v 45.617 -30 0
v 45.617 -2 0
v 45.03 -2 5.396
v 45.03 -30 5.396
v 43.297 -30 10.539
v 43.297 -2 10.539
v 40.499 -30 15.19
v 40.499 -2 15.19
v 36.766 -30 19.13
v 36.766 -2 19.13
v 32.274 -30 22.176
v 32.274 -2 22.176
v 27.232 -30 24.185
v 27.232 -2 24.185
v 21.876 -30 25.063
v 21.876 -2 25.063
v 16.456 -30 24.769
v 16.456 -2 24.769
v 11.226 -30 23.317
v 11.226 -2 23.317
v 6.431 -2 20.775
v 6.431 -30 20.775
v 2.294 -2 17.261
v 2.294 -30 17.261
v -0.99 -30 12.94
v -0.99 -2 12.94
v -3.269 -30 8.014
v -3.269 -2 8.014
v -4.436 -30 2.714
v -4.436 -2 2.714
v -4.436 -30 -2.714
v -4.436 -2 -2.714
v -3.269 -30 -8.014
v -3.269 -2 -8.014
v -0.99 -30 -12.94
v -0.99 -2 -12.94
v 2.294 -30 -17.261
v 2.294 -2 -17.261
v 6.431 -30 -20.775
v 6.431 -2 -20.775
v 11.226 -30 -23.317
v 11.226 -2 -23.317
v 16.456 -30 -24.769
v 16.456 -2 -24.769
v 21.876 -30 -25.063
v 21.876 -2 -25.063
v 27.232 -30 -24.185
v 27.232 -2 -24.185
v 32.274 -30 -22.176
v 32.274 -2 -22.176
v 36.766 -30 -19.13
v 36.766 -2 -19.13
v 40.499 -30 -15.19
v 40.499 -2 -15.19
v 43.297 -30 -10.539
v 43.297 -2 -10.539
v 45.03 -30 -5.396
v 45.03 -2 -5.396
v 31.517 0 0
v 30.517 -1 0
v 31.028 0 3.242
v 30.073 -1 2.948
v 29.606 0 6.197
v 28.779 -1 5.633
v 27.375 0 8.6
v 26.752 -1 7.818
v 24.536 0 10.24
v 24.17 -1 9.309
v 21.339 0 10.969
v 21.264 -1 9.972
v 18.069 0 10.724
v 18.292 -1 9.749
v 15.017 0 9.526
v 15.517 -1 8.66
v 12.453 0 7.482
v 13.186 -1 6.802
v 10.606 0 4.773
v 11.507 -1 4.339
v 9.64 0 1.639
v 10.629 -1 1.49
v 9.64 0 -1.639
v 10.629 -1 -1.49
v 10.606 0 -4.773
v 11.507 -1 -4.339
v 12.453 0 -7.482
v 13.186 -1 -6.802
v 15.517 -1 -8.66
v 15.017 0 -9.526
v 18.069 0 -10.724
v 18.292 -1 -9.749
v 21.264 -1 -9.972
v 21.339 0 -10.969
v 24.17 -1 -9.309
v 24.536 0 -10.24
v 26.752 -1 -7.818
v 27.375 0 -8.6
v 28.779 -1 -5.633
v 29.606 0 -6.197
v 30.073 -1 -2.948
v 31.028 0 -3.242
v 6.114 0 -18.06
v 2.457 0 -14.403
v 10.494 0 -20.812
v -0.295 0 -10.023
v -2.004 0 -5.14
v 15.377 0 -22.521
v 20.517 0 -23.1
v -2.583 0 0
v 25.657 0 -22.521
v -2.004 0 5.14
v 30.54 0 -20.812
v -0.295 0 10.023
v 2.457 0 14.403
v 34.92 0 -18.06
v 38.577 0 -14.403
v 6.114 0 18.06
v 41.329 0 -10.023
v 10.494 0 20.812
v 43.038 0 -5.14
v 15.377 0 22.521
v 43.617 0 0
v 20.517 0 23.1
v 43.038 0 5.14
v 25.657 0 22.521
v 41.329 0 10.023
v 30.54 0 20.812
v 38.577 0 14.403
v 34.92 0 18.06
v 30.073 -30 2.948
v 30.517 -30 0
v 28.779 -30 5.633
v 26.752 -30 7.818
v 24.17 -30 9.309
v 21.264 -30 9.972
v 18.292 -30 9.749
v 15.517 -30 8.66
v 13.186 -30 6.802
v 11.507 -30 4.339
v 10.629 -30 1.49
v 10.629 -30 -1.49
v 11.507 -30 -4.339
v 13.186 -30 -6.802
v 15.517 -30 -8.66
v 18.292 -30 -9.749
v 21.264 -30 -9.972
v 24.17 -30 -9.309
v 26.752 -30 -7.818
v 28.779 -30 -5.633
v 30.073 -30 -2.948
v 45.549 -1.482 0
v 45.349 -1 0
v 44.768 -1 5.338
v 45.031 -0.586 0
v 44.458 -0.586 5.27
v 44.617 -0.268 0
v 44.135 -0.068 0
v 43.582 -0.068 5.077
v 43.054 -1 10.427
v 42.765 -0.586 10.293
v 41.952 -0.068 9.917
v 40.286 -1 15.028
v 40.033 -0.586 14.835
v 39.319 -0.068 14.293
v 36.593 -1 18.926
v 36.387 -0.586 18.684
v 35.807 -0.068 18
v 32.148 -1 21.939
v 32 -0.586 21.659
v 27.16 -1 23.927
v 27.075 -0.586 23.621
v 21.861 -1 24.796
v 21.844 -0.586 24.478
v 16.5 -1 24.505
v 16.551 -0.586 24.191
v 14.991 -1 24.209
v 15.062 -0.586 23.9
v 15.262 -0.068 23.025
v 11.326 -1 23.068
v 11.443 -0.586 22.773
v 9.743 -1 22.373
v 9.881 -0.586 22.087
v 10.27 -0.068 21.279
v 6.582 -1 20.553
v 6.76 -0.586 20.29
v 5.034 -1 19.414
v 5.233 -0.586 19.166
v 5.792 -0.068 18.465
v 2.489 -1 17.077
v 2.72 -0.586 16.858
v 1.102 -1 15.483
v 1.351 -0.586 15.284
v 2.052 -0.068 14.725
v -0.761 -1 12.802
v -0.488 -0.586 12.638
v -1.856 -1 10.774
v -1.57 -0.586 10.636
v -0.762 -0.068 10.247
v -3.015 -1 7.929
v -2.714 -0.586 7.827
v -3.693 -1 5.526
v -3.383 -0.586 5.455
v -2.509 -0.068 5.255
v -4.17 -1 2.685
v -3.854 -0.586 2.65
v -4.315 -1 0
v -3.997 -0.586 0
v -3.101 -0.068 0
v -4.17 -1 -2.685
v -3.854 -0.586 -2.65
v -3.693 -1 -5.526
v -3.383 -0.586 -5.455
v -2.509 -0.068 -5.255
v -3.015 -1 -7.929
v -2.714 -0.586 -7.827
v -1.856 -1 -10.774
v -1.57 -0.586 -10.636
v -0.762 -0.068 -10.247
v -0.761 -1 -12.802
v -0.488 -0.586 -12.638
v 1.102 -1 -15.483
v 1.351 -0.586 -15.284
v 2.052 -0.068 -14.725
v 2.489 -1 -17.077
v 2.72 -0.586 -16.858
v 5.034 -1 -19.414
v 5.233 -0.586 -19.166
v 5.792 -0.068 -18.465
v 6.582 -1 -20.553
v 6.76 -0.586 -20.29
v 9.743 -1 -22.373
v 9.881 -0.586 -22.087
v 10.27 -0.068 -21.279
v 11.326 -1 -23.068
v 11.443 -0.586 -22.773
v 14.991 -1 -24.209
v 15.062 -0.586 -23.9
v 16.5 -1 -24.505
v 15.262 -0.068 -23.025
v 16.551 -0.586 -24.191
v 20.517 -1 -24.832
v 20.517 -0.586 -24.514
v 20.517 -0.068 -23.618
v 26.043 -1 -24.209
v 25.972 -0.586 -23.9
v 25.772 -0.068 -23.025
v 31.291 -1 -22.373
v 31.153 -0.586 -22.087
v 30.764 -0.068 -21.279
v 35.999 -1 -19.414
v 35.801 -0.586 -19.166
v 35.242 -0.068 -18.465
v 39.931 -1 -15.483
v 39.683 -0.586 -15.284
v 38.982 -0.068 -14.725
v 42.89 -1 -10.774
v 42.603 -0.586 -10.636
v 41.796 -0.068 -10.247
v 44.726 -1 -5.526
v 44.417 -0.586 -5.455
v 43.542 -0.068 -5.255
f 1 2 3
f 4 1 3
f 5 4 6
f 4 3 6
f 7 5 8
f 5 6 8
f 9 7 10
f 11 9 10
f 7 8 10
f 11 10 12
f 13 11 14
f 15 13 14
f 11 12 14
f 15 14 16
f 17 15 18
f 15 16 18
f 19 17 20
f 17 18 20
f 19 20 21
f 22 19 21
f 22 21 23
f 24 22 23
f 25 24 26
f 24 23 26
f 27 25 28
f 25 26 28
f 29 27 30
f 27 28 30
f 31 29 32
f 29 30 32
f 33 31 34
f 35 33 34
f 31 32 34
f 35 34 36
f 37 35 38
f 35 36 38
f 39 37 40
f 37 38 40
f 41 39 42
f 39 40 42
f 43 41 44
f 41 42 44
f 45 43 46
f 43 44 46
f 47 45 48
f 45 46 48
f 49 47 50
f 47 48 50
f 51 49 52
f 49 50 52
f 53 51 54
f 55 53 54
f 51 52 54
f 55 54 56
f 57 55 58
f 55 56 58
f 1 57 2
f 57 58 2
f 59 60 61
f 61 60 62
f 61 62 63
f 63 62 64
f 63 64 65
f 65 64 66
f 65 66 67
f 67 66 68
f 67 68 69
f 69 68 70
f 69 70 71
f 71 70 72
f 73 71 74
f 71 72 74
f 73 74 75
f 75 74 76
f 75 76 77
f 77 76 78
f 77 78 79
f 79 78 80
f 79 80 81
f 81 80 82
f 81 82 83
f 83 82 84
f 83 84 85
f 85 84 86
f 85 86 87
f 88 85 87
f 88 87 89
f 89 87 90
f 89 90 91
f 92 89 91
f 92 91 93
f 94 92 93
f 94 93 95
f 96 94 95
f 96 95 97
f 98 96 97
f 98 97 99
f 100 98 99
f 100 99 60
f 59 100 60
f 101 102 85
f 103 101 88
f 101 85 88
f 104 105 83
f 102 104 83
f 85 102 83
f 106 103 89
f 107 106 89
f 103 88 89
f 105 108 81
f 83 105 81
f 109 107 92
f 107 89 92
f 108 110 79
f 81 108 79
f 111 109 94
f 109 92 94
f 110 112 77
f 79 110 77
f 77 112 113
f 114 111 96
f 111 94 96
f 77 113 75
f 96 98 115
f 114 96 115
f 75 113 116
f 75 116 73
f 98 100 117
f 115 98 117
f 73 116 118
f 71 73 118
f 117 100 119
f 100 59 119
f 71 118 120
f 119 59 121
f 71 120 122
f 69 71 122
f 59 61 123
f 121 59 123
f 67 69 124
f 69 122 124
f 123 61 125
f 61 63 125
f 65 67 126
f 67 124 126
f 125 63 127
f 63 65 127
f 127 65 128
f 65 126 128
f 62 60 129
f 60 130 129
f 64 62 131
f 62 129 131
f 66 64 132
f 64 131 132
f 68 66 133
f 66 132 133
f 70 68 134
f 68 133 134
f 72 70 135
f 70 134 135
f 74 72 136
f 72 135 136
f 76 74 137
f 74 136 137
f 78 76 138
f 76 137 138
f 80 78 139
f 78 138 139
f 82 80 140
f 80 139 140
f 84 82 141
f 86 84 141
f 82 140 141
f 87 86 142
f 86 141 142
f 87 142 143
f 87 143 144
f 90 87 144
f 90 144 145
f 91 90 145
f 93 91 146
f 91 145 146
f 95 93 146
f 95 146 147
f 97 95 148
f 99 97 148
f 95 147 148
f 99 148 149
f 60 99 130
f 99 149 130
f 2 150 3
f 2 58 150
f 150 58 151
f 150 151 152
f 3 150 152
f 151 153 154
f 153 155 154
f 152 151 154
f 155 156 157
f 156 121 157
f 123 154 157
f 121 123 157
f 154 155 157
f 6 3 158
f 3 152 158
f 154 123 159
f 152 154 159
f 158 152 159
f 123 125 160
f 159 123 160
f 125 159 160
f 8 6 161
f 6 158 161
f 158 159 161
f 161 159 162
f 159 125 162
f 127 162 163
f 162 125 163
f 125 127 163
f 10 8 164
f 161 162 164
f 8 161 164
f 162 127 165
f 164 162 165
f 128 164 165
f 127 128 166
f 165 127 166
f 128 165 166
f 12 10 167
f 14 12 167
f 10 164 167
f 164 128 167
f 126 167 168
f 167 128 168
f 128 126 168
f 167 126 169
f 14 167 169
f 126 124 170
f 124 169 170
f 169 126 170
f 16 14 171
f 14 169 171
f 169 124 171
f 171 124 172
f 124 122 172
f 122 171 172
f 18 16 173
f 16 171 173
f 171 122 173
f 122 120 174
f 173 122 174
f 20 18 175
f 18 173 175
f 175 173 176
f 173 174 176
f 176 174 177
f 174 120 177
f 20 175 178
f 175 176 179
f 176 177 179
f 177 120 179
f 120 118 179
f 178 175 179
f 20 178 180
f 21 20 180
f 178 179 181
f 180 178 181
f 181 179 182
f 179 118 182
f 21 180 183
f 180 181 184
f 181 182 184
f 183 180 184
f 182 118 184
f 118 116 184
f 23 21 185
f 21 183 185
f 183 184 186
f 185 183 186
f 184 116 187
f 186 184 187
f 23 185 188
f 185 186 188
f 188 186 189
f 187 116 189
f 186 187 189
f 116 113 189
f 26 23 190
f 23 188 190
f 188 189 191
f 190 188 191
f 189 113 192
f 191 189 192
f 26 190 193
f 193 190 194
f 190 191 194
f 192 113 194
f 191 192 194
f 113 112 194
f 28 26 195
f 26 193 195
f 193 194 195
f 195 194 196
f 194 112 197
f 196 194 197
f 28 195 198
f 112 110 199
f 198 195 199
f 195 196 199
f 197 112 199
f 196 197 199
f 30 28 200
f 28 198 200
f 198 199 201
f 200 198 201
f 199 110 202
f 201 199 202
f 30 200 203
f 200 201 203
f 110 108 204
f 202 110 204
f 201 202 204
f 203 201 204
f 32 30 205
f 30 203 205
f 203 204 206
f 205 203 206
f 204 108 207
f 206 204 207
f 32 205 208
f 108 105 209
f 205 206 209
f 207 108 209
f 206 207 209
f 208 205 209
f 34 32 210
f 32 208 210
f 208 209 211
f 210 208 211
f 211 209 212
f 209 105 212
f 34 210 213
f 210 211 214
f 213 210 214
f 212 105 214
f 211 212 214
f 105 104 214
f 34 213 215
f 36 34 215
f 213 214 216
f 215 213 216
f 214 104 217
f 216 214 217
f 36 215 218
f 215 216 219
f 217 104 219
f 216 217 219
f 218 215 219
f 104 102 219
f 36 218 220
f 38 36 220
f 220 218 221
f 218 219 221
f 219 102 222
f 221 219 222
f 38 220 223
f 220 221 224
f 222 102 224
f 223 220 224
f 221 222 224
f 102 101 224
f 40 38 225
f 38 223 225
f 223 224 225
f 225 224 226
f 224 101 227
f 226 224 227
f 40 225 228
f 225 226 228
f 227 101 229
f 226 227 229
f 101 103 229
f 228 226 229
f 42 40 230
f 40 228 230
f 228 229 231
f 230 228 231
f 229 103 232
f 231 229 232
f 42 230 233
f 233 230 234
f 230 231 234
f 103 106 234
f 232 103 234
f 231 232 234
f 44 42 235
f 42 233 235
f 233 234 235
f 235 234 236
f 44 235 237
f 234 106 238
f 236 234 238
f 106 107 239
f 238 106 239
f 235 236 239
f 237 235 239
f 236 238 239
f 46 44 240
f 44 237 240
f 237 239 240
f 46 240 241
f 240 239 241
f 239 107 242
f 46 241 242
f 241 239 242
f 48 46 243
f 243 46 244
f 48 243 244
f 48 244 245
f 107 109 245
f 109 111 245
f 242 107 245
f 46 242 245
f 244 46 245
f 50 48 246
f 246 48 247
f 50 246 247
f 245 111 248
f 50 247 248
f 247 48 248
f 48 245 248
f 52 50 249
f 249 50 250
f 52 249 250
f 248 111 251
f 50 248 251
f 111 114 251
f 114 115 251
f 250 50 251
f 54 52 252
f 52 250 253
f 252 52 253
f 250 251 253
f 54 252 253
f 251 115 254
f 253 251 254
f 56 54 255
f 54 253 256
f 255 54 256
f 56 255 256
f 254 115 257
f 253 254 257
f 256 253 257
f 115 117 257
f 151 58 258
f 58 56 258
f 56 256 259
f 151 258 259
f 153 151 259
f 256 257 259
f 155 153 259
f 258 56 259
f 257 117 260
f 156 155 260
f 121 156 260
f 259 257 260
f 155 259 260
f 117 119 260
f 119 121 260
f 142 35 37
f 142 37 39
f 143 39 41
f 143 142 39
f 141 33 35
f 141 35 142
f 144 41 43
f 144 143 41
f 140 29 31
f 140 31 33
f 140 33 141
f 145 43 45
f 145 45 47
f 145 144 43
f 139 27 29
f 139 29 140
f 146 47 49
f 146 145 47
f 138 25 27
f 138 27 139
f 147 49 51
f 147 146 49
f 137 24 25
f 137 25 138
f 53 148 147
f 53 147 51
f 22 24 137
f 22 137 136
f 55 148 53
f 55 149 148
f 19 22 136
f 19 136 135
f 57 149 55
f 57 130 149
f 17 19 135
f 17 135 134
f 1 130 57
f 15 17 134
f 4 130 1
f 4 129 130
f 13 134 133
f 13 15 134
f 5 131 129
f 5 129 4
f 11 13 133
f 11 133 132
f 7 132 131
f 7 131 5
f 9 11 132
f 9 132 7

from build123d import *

# Parameters (mm, degrees)
F0_R           = 25.1
F1_DEPTH       = 30
F2_R           = 2
F5_D           = 20
F5_DEPTH       = 190
F5_CSINK_D     = 22
F5_CSINK_ANGLE = 90
F5_TIP         = 6.0086061903


# Not quite as in the source:
# - a feature of the source that left no trace in its solid (it failed there, or was rolled back) is left out


with BuildPart() as f1:
    # F0 (on Front) → F1 (new body)
    with BuildSketch(Plane.XZ):
        with Locations((20.5169470484, 0)):
            Circle(F0_R)
    extrude(amount=F1_DEPTH)

    # F2
    f2_edges = [f1.edges().sort_by_distance(p)[0] for p in [
        (-4.583053, 0, 0),
    ]]
    fillet(f2_edges, radius=F2_R)

    # F5
    with Locations(Plane(origin=(0, 0, 0), x_dir=(-1, 0, 0), z_dir=(0, 1, 0))):
        with Locations((-20.5169470484, 0)):
            CounterSinkHole(F5_D / 2, F5_CSINK_D / 2, depth=F5_DEPTH, counter_sink_angle=F5_CSINK_ANGLE)
            with Locations((0, 0, -(F5_DEPTH + F5_TIP / 2))):  # 118° drill point
                Cone(0, F5_D / 2, F5_TIP, mode=Mode.SUBTRACT)


solid = f1.part
